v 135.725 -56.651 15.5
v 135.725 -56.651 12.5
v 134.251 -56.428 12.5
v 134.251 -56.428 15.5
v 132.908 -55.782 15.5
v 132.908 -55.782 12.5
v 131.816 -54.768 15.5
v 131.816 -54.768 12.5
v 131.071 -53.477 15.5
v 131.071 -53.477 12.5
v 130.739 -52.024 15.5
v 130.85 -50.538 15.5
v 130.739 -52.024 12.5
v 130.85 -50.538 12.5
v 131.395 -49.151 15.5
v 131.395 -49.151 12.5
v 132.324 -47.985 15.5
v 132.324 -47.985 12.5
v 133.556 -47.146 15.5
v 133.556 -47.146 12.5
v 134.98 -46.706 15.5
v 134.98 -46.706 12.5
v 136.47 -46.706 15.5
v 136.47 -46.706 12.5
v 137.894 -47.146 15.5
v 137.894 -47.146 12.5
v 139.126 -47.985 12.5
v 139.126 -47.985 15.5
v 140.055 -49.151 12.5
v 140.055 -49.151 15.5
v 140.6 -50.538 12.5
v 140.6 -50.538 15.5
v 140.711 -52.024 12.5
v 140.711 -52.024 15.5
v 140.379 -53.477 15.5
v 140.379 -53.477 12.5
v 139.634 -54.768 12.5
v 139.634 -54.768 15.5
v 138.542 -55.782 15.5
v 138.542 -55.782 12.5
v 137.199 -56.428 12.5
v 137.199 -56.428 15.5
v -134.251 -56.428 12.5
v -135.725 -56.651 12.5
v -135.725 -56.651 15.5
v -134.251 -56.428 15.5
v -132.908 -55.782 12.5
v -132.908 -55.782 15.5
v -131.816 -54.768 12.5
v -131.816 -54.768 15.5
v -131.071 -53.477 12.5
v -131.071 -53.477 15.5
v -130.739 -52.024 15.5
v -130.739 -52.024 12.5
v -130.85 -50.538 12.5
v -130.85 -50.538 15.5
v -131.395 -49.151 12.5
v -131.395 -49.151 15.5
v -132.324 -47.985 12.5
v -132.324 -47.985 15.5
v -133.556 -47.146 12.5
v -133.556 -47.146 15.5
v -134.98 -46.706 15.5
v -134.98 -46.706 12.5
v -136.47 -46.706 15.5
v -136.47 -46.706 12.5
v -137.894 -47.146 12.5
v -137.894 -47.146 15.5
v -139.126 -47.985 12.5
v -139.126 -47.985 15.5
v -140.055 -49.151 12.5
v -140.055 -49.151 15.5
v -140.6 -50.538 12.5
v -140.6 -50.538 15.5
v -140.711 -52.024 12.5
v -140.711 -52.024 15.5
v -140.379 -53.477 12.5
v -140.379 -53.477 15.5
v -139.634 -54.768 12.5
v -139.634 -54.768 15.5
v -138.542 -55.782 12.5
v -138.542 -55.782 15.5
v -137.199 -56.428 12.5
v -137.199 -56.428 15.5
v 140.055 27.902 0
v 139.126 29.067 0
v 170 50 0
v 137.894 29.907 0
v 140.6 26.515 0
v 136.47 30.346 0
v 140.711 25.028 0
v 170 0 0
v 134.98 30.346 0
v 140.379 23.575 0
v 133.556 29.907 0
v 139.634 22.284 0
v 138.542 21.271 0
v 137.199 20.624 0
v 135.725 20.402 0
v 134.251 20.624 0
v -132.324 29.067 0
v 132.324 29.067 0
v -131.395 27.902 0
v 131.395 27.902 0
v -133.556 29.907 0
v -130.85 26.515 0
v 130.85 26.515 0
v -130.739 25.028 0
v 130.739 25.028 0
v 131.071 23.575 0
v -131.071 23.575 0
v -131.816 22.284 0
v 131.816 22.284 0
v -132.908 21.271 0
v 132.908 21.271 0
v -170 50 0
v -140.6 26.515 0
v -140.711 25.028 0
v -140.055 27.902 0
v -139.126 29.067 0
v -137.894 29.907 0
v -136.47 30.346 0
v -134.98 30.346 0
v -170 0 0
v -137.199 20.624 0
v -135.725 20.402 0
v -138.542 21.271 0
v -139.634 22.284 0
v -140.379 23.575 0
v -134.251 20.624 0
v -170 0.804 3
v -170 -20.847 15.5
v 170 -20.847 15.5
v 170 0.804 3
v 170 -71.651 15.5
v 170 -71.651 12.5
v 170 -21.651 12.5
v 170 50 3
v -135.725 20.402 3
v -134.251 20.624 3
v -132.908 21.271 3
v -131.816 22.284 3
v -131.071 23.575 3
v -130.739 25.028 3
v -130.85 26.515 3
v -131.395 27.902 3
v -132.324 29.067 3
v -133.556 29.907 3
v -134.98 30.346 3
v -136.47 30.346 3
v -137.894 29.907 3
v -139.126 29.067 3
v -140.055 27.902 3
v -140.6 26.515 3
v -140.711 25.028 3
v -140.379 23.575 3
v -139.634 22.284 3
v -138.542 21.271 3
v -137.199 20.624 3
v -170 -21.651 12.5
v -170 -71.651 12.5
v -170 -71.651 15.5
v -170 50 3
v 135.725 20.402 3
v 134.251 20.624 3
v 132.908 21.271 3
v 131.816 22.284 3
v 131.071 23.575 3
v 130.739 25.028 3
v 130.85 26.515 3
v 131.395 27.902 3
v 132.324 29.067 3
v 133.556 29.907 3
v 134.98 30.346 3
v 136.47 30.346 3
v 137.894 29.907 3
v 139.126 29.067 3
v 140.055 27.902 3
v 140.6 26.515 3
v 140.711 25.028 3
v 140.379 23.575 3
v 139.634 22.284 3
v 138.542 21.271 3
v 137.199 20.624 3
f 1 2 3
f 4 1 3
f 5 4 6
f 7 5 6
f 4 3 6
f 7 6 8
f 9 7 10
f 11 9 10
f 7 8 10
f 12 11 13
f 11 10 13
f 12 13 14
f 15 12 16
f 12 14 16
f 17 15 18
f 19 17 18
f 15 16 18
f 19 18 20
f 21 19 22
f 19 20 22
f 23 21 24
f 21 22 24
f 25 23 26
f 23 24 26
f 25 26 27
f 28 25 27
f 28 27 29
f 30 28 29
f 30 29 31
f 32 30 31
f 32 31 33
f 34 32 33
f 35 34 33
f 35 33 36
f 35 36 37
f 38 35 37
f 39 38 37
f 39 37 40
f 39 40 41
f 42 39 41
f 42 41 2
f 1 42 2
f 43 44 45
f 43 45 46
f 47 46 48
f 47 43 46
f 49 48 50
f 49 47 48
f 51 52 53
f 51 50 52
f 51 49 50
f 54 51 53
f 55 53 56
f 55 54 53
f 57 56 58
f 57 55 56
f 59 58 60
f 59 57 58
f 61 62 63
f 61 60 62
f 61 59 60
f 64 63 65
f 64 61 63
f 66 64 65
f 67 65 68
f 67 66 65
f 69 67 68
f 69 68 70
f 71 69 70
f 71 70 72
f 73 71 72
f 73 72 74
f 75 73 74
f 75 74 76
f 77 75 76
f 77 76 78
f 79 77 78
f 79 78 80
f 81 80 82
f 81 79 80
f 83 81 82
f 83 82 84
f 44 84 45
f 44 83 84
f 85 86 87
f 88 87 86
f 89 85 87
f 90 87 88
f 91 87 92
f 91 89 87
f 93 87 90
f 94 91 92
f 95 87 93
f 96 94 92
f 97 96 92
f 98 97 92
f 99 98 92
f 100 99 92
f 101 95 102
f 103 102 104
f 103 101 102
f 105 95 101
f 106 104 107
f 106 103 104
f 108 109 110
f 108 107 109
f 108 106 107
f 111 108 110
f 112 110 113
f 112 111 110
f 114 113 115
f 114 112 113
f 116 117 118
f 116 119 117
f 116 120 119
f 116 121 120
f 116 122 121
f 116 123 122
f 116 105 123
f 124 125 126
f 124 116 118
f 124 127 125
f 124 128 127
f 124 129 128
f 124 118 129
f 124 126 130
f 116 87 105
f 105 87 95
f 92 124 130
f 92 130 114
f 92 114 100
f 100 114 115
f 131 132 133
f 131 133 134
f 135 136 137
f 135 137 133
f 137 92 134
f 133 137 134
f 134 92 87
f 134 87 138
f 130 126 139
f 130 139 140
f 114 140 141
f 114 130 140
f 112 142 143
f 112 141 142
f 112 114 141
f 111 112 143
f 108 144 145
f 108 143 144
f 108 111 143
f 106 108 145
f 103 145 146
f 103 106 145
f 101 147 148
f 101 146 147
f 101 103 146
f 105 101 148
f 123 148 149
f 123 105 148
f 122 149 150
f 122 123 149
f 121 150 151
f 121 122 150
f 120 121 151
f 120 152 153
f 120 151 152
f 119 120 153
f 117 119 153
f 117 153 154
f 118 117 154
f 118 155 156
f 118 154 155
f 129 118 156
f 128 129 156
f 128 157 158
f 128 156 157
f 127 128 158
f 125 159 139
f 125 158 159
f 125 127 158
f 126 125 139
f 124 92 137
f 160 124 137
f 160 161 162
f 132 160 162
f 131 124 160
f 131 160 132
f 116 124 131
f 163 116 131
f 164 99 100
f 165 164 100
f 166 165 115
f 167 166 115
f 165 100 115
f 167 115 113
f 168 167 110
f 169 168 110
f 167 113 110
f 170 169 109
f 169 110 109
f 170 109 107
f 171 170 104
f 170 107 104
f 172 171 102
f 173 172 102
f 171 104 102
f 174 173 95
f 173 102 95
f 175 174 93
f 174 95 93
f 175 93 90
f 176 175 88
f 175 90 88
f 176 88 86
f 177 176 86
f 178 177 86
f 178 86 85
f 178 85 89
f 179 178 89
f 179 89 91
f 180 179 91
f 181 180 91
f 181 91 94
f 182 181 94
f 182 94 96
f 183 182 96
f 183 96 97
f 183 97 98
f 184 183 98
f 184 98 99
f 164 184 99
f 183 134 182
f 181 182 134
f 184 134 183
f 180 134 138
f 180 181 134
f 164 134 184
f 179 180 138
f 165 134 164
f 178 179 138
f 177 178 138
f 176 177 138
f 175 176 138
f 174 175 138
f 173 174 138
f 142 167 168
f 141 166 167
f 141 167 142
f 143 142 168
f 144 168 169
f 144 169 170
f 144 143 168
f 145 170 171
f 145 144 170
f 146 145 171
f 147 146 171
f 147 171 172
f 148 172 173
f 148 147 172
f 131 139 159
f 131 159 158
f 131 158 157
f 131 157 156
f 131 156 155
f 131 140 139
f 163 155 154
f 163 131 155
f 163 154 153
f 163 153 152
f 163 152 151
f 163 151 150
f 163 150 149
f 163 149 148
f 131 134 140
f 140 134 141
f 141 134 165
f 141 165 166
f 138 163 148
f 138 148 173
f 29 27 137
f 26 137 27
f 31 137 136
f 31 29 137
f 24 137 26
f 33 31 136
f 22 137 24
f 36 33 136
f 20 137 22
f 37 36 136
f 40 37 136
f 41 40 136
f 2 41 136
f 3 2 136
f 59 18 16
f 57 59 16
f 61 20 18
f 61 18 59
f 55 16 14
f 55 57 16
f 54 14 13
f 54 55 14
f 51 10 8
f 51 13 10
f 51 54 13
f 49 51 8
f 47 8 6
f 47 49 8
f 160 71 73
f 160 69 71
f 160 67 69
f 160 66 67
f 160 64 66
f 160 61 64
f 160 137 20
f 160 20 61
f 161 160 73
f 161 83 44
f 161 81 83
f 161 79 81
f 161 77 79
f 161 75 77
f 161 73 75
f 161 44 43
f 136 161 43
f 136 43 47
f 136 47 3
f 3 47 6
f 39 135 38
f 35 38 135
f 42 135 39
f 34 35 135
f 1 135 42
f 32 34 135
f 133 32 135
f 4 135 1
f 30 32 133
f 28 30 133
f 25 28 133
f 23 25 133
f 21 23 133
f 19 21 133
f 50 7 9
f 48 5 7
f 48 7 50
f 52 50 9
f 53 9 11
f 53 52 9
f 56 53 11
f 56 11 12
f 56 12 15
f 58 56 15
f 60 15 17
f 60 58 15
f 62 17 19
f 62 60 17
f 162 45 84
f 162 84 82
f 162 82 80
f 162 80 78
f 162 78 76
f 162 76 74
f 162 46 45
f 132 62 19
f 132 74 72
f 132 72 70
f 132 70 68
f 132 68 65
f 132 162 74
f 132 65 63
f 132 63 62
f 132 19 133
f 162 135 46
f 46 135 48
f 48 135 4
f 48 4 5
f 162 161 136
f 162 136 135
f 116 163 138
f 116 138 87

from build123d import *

# Parameters (mm, degrees)
WYCI_GNI_CIE_CIENKA_CIANKA2_DEPTH      = 170
WYCI_GNI_CIE_CIENKA_CIANKA2_DEPTH_BACK = 170
WYTNIJ_WYCI_GNI_CIE2_START             = -10
SZKIC3_R                               = 5
WYTNIJ_WYCI_GNI_CIE2_DEPTH             = 50


with BuildPart() as part:
    # Szkic2 → Wyciągnięcie-cienka ścianka2 (new, two sides: drawn at the far end of the back side and taken through both)
    with BuildSketch(Plane(origin=(0, 0, 0), x_dir=(0, 0, -1), z_dir=(1, 0, 0)).offset(-WYCI_GNI_CIE_CIENKA_CIANKA2_DEPTH_BACK)):
        Polygon((0, 50), (0, 0), (-12.5, -21.650635095), (-12.5, -71.650635095), (-15.5, -71.650635095), (-15.5, -20.846787517), (-3, 0.803847577), (-3, 50), align=None)
    extrude(amount=WYCI_GNI_CIE_CIENKA_CIANKA2_DEPTH + WYCI_GNI_CIE_CIENKA_CIANKA2_DEPTH_BACK)

    # Szkic3 → Wytnij-wyciągnięcie2 (cut)
    with BuildSketch(Plane.XY.offset(3).offset(WYTNIJ_WYCI_GNI_CIE2_START)):
        with Locations(Location((-135.725, 25.401923789, 0), (0, 0, 270))):
            Circle(SZKIC3_R)
        with Locations(Location((-135.725, -51.650635095, 0), (0, 0, 270))):
            Circle(SZKIC3_R)
    wytnij_wyci_gni_cie2 = extrude(amount=WYTNIJ_WYCI_GNI_CIE2_DEPTH, mode=Mode.SUBTRACT)

    # Lustro1: Wytnij-wyciągnięcie2 across plane
    add(wytnij_wyci_gni_cie2.mirror(Plane(origin=(0, 0, 0), x_dir=(0, 0, 1), z_dir=(1, 0, 0))), mode=Mode.SUBTRACT)


solid = part.part
